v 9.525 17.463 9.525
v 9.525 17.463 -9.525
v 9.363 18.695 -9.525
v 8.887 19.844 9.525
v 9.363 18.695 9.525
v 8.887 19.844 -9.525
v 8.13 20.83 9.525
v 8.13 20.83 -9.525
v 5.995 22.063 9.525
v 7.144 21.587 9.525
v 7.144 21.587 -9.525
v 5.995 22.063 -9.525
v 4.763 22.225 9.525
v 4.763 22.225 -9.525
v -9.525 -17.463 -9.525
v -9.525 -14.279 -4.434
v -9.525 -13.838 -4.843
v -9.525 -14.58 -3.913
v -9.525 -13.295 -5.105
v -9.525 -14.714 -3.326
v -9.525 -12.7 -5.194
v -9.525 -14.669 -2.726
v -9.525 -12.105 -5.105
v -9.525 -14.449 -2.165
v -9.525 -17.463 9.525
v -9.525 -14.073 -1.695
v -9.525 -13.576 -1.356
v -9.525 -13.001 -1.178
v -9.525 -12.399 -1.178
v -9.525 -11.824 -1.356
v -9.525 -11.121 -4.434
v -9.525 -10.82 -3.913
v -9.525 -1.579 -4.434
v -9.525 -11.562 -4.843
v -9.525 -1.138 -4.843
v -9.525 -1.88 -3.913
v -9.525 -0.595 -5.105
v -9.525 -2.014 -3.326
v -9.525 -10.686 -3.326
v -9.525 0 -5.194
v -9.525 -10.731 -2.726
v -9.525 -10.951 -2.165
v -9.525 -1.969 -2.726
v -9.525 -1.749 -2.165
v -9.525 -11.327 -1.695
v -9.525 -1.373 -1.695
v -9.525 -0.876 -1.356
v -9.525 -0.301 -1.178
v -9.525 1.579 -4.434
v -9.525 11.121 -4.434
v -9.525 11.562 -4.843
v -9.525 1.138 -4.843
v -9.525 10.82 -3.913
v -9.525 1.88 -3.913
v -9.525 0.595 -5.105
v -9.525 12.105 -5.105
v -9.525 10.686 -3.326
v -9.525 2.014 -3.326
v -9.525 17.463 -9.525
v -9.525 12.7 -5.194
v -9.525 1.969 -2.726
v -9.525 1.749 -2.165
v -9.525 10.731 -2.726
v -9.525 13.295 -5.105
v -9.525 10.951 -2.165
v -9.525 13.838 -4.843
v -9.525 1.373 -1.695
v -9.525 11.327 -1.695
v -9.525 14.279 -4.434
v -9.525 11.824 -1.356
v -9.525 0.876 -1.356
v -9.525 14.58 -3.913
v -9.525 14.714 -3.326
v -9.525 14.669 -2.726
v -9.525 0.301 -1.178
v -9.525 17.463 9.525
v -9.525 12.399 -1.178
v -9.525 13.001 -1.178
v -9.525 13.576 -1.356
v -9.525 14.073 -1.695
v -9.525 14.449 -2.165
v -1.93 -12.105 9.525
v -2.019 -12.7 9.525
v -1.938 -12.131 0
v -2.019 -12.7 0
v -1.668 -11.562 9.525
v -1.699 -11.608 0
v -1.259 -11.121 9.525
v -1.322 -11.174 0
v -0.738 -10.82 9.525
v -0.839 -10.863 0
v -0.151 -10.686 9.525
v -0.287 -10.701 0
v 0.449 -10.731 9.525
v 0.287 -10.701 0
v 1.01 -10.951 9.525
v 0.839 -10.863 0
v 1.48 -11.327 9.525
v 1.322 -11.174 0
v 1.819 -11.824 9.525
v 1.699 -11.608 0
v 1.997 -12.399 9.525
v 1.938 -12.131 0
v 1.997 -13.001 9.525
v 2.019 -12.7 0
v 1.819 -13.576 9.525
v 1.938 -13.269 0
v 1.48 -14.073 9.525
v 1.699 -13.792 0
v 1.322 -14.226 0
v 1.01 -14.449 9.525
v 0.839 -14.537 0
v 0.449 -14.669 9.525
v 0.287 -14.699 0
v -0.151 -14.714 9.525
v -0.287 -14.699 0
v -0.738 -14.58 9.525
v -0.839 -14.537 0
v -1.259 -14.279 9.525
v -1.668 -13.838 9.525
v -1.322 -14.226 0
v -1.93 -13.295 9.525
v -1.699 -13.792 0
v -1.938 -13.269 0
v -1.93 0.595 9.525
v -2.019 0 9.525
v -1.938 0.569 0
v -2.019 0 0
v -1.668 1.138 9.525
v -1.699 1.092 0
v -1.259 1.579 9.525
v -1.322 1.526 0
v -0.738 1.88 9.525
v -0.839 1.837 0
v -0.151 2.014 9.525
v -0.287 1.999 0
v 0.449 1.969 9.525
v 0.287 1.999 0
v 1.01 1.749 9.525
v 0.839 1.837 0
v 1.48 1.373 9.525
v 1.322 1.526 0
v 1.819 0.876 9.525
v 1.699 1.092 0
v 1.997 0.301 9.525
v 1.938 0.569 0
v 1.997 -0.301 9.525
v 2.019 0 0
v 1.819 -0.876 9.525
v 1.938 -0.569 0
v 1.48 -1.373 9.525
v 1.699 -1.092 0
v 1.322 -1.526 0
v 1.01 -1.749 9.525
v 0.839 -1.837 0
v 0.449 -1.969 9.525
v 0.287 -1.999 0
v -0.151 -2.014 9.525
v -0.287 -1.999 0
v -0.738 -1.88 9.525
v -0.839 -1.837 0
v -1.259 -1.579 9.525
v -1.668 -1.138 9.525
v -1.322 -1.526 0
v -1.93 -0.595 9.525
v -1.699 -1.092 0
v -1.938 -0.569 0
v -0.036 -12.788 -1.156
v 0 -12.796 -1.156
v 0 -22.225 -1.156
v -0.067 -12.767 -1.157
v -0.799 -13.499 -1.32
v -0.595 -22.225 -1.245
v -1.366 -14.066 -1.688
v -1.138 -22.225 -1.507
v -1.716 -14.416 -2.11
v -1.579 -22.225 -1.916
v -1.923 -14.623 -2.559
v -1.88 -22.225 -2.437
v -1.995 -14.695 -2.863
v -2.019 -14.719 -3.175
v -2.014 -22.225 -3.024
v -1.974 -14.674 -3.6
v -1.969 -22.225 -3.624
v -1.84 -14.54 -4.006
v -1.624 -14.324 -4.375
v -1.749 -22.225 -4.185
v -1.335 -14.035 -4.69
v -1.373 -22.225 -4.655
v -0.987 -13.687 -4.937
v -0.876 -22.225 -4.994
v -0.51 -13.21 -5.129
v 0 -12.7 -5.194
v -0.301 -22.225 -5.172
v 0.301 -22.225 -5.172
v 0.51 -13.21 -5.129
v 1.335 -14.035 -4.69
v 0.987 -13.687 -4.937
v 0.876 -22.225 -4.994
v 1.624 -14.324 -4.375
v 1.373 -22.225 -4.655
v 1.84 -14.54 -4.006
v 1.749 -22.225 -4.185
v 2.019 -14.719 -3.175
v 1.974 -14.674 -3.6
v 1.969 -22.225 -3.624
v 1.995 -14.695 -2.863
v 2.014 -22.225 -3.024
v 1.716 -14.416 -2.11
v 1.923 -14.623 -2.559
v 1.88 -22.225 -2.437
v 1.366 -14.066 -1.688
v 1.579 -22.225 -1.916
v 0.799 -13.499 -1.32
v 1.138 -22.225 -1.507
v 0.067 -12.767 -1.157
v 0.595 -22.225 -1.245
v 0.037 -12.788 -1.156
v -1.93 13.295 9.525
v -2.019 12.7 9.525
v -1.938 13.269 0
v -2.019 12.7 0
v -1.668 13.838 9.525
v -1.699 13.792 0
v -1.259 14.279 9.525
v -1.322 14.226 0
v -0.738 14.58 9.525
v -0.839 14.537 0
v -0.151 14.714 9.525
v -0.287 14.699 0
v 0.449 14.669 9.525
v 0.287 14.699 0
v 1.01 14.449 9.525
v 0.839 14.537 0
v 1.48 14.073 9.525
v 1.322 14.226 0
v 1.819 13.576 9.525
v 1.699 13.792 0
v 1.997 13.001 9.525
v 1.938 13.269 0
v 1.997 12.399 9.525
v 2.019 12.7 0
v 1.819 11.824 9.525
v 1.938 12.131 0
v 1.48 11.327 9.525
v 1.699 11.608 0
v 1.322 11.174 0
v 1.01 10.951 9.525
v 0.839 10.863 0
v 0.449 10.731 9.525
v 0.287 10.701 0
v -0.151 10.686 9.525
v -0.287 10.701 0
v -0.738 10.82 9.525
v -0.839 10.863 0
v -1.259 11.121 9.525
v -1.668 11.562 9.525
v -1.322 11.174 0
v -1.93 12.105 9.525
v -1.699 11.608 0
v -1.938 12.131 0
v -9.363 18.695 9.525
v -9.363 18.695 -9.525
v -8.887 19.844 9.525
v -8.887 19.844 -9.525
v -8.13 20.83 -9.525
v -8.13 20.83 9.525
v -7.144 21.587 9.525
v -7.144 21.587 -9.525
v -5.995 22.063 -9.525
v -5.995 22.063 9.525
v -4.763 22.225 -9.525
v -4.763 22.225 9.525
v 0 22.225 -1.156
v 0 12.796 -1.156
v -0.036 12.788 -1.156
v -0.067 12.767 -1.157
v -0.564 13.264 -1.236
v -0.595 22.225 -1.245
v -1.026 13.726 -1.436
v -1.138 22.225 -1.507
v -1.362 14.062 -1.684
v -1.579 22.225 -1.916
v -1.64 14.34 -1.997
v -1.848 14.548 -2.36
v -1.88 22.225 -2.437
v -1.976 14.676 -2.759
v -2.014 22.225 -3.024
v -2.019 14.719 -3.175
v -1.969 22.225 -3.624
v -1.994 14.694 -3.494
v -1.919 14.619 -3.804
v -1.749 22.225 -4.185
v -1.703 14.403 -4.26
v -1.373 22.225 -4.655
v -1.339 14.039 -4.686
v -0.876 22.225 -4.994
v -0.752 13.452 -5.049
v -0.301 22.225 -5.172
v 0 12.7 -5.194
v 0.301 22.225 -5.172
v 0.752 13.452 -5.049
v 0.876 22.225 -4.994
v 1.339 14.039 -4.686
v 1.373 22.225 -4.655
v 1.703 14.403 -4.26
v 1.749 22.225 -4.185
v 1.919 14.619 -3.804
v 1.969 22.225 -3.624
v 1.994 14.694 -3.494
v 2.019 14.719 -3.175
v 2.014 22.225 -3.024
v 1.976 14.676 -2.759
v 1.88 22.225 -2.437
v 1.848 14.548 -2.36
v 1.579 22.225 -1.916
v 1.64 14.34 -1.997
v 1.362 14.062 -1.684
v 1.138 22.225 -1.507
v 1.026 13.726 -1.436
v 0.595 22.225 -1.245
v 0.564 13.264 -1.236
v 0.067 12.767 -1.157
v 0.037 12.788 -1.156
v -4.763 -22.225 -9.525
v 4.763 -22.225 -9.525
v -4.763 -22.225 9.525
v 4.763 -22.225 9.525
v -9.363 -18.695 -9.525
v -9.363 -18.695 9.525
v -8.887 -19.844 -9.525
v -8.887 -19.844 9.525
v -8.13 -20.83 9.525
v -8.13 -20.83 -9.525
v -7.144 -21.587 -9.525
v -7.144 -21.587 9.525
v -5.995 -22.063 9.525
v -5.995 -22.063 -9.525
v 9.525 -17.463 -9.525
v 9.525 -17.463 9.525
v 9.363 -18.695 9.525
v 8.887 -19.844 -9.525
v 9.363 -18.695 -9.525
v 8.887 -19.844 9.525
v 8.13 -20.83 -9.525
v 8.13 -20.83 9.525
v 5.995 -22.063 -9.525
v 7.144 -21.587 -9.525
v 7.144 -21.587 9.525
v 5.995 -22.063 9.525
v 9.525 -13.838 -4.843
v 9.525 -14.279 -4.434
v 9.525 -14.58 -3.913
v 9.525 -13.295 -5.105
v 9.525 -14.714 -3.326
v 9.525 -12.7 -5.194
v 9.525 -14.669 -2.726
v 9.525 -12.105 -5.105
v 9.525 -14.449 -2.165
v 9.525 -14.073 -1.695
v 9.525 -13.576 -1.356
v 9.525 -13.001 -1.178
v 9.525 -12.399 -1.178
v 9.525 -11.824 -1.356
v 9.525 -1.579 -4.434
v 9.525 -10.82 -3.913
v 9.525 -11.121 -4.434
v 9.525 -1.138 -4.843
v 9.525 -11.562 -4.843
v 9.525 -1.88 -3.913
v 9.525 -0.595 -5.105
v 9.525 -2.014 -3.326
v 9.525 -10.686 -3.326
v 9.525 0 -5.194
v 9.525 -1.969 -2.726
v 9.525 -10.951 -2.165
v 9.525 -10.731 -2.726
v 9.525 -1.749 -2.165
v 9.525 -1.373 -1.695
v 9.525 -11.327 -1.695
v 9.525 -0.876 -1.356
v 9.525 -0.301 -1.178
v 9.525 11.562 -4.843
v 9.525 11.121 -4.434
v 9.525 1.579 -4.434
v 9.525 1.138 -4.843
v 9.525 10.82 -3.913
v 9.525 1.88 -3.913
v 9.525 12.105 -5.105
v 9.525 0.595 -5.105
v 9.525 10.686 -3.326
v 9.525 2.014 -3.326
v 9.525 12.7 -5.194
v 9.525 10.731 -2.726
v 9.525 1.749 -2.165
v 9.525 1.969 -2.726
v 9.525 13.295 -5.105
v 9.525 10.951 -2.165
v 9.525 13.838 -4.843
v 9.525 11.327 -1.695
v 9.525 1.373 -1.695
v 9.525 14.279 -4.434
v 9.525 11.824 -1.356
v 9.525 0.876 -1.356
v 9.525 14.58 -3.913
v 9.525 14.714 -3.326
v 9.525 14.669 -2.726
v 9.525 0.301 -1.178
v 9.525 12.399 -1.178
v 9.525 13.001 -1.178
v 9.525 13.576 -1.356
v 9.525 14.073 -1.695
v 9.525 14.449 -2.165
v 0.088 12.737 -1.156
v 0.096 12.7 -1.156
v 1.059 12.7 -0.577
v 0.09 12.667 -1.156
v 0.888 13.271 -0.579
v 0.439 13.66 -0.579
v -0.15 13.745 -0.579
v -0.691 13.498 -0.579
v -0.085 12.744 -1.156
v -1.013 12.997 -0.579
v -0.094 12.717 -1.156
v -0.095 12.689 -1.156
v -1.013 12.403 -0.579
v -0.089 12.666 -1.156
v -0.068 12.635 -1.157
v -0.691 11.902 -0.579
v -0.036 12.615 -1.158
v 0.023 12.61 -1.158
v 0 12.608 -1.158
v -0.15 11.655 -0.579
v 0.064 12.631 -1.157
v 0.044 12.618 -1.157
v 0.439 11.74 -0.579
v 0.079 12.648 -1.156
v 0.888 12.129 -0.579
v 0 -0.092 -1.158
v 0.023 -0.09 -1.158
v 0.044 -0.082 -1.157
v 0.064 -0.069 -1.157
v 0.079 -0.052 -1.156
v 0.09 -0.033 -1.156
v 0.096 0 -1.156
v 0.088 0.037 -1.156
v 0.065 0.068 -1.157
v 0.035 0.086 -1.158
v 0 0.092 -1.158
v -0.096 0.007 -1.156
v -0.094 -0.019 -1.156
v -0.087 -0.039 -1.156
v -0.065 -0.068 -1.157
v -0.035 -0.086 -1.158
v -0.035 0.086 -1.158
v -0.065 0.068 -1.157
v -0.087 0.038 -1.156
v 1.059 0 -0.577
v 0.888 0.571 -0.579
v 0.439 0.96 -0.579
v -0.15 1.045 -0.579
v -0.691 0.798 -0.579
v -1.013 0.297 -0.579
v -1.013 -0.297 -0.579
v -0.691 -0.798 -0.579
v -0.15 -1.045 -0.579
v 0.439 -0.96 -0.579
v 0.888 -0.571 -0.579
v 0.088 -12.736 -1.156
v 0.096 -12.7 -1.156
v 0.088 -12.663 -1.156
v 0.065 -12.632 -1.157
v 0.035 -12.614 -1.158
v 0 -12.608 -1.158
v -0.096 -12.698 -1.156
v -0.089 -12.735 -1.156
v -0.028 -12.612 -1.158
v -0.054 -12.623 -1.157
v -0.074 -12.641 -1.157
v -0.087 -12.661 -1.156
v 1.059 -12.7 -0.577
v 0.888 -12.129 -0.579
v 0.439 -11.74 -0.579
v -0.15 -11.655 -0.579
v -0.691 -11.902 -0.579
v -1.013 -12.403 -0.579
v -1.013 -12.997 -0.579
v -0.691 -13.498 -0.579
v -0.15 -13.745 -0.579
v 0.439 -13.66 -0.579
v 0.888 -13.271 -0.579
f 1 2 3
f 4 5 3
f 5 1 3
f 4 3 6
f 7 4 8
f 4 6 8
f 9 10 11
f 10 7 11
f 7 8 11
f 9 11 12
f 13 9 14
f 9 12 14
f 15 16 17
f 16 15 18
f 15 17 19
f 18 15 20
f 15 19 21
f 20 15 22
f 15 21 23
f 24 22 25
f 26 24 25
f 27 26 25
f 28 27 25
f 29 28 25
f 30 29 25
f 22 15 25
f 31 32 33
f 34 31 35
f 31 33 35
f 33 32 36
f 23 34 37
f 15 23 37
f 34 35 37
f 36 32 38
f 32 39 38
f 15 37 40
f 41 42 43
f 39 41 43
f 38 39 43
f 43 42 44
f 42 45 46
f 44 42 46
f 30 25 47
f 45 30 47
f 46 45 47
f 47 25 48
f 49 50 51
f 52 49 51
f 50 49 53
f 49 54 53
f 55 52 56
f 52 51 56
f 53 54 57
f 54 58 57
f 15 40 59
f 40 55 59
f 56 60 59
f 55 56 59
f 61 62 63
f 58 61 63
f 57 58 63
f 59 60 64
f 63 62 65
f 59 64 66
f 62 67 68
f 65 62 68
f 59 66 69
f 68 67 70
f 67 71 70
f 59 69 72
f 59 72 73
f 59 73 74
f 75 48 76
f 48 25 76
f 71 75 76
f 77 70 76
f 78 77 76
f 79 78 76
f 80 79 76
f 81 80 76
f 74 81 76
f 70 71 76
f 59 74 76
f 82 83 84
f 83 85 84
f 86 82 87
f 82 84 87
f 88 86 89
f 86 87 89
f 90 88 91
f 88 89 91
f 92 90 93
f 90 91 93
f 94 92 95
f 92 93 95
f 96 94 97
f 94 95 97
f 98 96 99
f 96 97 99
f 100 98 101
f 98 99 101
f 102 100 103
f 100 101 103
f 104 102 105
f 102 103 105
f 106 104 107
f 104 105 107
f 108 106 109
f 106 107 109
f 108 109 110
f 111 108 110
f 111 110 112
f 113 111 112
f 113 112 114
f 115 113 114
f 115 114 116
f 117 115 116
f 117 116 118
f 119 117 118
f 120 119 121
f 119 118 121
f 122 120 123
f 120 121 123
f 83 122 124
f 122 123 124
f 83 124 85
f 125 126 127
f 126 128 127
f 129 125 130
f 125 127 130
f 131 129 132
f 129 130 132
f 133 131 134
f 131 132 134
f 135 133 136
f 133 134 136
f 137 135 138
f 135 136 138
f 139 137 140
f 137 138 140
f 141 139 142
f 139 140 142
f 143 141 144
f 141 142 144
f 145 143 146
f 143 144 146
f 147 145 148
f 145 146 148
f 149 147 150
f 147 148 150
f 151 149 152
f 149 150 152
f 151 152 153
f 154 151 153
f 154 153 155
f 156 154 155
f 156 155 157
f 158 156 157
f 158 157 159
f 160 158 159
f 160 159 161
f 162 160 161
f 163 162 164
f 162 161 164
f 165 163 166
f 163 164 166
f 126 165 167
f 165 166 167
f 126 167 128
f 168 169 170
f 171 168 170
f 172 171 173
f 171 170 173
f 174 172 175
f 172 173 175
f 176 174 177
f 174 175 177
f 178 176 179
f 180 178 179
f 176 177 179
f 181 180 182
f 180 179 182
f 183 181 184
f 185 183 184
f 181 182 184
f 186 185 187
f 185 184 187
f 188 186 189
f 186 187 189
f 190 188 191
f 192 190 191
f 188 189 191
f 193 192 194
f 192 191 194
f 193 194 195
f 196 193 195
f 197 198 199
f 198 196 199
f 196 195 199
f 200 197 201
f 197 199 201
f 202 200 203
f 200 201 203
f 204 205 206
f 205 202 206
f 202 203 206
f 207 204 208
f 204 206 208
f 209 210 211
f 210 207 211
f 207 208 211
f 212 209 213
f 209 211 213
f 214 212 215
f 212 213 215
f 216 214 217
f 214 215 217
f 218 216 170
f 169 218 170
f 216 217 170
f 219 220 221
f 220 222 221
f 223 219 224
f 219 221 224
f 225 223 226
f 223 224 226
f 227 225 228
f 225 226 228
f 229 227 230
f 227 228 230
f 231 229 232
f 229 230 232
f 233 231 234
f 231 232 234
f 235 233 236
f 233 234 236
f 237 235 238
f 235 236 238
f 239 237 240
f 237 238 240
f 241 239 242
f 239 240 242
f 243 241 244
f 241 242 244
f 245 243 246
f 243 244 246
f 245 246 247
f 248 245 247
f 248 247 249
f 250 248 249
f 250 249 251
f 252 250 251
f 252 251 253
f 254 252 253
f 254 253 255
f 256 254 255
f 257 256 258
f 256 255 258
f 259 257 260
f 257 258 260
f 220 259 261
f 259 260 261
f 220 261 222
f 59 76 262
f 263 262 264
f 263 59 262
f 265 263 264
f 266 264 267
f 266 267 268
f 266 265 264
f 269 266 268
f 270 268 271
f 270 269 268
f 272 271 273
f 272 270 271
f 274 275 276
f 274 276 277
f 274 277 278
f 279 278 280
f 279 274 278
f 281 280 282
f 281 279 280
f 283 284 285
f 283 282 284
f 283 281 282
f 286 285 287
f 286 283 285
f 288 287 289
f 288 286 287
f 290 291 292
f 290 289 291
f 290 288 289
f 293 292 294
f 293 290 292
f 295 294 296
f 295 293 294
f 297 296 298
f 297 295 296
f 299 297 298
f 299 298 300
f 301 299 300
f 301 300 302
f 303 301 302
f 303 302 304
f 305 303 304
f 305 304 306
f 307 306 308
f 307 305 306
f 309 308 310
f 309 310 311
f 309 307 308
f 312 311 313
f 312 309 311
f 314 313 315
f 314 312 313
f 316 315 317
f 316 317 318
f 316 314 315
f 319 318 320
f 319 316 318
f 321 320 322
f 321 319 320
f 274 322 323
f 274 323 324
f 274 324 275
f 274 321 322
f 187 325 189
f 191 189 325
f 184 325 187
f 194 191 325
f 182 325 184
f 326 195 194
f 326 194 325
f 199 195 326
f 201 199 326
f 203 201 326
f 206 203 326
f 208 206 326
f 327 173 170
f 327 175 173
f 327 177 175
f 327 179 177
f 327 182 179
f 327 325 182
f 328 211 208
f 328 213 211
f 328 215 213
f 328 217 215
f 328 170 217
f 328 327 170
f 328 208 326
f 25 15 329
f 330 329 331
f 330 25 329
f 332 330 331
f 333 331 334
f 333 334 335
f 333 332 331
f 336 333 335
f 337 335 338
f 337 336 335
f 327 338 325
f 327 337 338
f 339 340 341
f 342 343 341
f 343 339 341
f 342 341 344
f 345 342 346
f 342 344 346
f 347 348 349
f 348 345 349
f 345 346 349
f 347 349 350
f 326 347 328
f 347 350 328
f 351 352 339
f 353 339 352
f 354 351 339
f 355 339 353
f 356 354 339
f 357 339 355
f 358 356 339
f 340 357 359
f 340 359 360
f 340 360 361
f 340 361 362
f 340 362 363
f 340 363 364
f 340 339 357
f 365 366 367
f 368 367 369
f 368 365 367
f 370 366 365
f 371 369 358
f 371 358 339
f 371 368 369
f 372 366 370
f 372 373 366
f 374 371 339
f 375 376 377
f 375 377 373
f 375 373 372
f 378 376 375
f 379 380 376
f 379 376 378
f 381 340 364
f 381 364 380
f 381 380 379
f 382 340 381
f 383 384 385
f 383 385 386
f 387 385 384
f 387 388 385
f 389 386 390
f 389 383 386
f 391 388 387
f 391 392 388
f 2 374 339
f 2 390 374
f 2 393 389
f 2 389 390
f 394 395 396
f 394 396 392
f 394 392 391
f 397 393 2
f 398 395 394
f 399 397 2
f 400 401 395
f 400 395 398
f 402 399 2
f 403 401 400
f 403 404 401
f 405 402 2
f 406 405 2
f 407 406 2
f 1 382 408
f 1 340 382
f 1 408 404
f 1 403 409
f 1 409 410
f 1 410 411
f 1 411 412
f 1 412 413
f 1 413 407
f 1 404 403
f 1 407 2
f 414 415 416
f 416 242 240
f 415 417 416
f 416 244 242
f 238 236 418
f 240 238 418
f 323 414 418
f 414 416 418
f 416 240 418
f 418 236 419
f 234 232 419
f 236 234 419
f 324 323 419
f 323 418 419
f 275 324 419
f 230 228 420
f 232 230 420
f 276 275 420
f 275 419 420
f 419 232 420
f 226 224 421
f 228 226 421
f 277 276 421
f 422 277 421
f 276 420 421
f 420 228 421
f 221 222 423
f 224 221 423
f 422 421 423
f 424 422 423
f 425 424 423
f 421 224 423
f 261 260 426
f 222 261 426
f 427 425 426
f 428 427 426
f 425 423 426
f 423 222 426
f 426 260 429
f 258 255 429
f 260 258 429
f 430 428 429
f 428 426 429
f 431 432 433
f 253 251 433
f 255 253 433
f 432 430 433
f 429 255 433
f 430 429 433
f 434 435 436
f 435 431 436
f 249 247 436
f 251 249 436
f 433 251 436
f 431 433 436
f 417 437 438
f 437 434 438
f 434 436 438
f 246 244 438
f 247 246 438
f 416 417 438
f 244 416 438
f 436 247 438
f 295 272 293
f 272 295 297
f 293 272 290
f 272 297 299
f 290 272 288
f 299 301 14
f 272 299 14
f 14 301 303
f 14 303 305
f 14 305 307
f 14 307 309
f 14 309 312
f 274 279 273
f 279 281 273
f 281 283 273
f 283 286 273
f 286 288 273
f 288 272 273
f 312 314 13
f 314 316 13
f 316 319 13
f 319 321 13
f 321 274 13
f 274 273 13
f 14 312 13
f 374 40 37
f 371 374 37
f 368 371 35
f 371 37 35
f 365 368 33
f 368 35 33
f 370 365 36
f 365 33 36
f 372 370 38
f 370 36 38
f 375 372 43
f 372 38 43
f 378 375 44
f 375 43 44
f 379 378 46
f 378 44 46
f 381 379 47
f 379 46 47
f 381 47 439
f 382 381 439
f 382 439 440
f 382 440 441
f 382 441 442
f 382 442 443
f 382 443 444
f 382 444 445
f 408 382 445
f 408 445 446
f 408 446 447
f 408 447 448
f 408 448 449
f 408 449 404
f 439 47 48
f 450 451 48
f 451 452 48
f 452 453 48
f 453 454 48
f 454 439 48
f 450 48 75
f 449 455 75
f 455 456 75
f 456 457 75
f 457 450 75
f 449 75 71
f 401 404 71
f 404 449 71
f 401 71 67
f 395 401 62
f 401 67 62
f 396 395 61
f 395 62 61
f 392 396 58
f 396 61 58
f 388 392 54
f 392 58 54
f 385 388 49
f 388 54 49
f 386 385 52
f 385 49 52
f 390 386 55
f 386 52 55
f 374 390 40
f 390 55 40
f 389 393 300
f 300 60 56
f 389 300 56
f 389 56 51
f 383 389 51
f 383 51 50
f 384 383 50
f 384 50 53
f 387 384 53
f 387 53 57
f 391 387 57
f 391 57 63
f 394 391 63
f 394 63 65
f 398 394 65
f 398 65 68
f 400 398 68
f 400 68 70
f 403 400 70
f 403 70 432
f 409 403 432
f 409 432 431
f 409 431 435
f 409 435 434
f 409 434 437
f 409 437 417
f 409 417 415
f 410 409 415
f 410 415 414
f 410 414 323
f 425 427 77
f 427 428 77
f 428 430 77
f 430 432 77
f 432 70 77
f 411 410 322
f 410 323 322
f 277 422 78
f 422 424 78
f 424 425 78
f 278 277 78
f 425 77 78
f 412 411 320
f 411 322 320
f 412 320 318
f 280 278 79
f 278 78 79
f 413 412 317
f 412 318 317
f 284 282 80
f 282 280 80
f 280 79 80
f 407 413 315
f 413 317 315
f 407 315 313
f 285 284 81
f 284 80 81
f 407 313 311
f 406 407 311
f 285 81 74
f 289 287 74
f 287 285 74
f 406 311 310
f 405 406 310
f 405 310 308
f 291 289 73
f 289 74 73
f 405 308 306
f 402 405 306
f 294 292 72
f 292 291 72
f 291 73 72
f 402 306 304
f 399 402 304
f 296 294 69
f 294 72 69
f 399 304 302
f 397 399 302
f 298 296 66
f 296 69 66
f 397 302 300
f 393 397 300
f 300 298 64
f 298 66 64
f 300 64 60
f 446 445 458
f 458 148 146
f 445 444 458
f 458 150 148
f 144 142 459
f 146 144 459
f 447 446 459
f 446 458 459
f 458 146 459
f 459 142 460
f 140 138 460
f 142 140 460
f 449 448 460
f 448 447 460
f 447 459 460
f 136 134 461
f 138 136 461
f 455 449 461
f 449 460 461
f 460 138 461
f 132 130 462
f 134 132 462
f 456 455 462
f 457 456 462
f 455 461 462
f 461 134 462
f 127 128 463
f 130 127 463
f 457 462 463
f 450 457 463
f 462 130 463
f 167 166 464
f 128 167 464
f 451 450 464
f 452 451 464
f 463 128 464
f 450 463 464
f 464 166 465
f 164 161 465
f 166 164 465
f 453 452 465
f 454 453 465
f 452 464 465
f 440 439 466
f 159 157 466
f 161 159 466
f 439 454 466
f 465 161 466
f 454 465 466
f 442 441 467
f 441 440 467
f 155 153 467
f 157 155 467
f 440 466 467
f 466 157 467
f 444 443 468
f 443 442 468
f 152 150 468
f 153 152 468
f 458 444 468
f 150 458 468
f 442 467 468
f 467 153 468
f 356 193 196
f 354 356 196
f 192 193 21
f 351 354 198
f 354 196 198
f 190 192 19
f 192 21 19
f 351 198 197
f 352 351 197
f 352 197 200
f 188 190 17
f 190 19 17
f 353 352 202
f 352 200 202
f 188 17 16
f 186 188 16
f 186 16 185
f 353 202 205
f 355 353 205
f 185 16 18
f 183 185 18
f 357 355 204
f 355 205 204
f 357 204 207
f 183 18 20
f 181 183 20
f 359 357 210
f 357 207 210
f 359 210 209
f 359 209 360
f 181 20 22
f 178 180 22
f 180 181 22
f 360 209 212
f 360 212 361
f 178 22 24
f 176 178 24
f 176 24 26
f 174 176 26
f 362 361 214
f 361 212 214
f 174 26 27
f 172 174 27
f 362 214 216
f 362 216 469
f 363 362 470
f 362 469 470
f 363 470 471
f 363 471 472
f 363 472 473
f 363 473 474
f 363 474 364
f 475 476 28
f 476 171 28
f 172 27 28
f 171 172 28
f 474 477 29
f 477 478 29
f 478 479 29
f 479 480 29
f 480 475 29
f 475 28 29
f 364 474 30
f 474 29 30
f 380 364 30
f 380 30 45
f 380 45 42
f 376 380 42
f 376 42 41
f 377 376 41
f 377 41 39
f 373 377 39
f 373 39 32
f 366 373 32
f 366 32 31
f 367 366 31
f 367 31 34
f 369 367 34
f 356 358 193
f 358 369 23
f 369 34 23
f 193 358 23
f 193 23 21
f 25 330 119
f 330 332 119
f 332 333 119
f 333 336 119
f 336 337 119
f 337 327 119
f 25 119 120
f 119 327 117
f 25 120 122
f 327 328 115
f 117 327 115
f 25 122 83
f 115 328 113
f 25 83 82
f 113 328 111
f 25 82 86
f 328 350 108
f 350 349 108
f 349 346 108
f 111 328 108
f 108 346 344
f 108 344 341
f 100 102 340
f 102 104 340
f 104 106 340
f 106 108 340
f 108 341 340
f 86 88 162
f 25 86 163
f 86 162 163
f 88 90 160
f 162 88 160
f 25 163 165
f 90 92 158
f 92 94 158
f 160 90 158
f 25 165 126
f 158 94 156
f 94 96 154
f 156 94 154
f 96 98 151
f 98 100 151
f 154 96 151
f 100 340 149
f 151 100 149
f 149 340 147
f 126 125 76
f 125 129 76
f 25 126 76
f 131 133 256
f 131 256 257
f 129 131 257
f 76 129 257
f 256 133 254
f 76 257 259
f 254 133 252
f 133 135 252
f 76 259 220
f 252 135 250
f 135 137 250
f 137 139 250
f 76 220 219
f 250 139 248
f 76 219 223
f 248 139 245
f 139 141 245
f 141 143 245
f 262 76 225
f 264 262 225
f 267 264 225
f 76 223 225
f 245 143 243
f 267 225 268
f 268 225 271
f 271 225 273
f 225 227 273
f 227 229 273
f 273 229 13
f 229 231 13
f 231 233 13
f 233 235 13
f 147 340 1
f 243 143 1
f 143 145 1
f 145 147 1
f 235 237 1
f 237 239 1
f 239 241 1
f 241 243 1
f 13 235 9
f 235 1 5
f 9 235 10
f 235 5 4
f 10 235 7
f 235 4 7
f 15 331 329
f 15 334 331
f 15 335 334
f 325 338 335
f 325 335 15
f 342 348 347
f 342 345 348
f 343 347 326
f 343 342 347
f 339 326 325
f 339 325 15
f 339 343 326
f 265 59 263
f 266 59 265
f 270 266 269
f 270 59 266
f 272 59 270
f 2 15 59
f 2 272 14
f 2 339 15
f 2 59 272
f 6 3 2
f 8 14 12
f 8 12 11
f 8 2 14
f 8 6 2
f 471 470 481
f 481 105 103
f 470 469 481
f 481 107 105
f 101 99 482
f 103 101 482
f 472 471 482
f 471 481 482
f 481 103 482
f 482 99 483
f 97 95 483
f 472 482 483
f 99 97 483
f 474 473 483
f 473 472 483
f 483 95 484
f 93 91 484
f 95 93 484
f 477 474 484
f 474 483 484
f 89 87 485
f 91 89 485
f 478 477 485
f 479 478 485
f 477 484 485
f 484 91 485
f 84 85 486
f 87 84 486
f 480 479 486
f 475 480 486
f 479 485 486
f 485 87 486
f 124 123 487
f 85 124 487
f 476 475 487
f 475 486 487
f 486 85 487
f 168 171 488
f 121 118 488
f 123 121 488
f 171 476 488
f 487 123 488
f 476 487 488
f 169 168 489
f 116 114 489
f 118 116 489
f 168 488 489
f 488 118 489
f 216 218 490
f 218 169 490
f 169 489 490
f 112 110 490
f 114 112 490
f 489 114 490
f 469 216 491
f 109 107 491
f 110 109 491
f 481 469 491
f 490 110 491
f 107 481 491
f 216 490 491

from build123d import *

# Parameters (mm, degrees)
SKETCH3_W                       = 19.05
SKETCH3_H                       = 44.45
BOSS_EXTRUDE1_DEPTH             = 457.2
BOSS_EXTRUDE1_DEPTH_BACK        = 457.2
FILLET1_R                       = 4.7625
SKETCH4_W                       = 447.675
SKETCH4_H                       = 44.45
CUT_EXTRUDE1_DEPTH              = 20.05
F_10_32_TAPPED_HOLE1_AT_2_COUNT = 2
F_10_32_TAPPED_HOLE1_AT_2_PITCH = 12.7
F_10_32_TAPPED_HOLE1_AT_3_COUNT = 2
F_10_32_TAPPED_HOLE1_AT_3_PITCH = 25.4
F_10_32_TAPPED_HOLE2_D          = 4.0386
F_10_32_TAPPED_HOLE2_DEPTH      = 9.525
F_10_32_TAPPED_HOLE2_TIP        = 1.213317848


with BuildPart() as part:
    # Sketch3 → Boss-Extrude1 (new body, two sides)
    with BuildSketch(Plane.XY) as boss_extrude1_sk:
        Rectangle(SKETCH3_W, SKETCH3_H)
    extrude(amount=BOSS_EXTRUDE1_DEPTH)
    extrude(boss_extrude1_sk.sketch, amount=-BOSS_EXTRUDE1_DEPTH_BACK)

    # Fillet1
    fillet1_edges = [part.edges().sort_by_distance(p)[0] for p in [
        (9.525, -22.225, 0),
        (-9.525, -22.225, 0),
        (-9.525, 22.225, 0),
        (9.525, 22.225, 0),
    ]]
    fillet(fillet1_edges, radius=FILLET1_R)

    # Sketch4 → Cut-Extrude1 (cut, through all)
    with BuildSketch(Plane(origin=(9.525, 0, 0), x_dir=(0, 0, -1), z_dir=(1, 0, 0))):
        with Locations((-233.3625, 0)):
            Rectangle(SKETCH4_W, SKETCH4_H)
        with Locations((233.3625, 0)):
            Rectangle(SKETCH4_W, SKETCH4_H)
    extrude(amount=-CUT_EXTRUDE1_DEPTH, mode=Mode.SUBTRACT)

    # Sketch6 → #10-32 Tapped Hole1 (revolve, cut)
    with BuildSketch(Plane(origin=(9.525, 12.7, -3.175), x_dir=(0, 0, -1), z_dir=(0, 1, 0))):
        Polygon((0, 0), (0, 10.738317848), (2.0193, 9.525), (2.0193, 0), align=None)
    f_10_32_tapped_hole1 = revolve(axis=Axis((15.875, 12.7, -3.175), (-1, 0, 0)), mode=Mode.SUBTRACT)

    # #10-32 Tapped Hole1 at 2: #10-32 Tapped Hole1 ×2
    with Locations(*[(0, -i * F_10_32_TAPPED_HOLE1_AT_2_PITCH, 0) for i in range(1, F_10_32_TAPPED_HOLE1_AT_2_COUNT)]):
        add(f_10_32_tapped_hole1, mode=Mode.SUBTRACT)

    # #10-32 Tapped Hole1 at 3: #10-32 Tapped Hole1 ×2
    with Locations(*[(0, -i * F_10_32_TAPPED_HOLE1_AT_3_PITCH, 0) for i in range(1, F_10_32_TAPPED_HOLE1_AT_3_COUNT)]):
        add(f_10_32_tapped_hole1, mode=Mode.SUBTRACT)

    # #10-32 Tapped Hole2
    with Locations(Plane.XY.offset(9.525)):
        with Locations((0, 0), (0, 12.7), (0, -12.7)):
            Hole(F_10_32_TAPPED_HOLE2_D / 2, depth=F_10_32_TAPPED_HOLE2_DEPTH)
            with Locations((0, 0, -(F_10_32_TAPPED_HOLE2_DEPTH + F_10_32_TAPPED_HOLE2_TIP / 2))):  # 118° drill point
                Cone(0, F_10_32_TAPPED_HOLE2_D / 2, F_10_32_TAPPED_HOLE2_TIP, mode=Mode.SUBTRACT)

    # Sketch12 → #10-32 Tapped Hole3 (revolve, cut)
    with BuildSketch(Plane(origin=(0, 22.225, -3.175), x_dir=(0, 0, 1), z_dir=(1, 0, 0))):
        Polygon((0, 0), (0, 10.738317848), (2.0193, 9.525), (2.0193, 0), align=None)
    f_10_32_tapped_hole3 = revolve(axis=Axis((0, 28.575, -3.175), (0, -1, 0)), mode=Mode.SUBTRACT)

    # Mirror1: #10-32 Tapped Hole3 across plane
    add(f_10_32_tapped_hole3.mirror(Plane.ZX), mode=Mode.SUBTRACT)

    # Mirror2: #10-32 Tapped Hole1 across plane
    add(f_10_32_tapped_hole1.mirror(Plane(origin=(0, 0, 0), x_dir=(0, 0, 1), z_dir=(1, 0, 0))), mode=Mode.SUBTRACT)

    # Mirror2 copy 1 sketch → Mirror2 copy 1 (revolve, cut)
    with BuildSketch(Plane(origin=(-9.525, 0, -3.175), x_dir=(0, 0, -1), z_dir=(0, 1, 0))):
        Polygon((0, 0), (0, -10.738317848), (2.0193, -9.525), (2.0193, 0), align=None)
    revolve(axis=Axis((-15.875, 0, -3.175), (-1, 0, 0)), mode=Mode.SUBTRACT)

    # Mirror2 copy 2 sketch → Mirror2 copy 2 (revolve, cut)
    with BuildSketch(Plane(origin=(-9.525, -12.7, -3.175), x_dir=(0, 0, -1), z_dir=(0, 1, 0))):
        Polygon((0, 0), (0, -10.738317848), (2.0193, -9.525), (2.0193, 0), align=None)
    revolve(axis=Axis((-15.875, -12.7, -3.175), (-1, 0, 0)), mode=Mode.SUBTRACT)


solid = part.part
